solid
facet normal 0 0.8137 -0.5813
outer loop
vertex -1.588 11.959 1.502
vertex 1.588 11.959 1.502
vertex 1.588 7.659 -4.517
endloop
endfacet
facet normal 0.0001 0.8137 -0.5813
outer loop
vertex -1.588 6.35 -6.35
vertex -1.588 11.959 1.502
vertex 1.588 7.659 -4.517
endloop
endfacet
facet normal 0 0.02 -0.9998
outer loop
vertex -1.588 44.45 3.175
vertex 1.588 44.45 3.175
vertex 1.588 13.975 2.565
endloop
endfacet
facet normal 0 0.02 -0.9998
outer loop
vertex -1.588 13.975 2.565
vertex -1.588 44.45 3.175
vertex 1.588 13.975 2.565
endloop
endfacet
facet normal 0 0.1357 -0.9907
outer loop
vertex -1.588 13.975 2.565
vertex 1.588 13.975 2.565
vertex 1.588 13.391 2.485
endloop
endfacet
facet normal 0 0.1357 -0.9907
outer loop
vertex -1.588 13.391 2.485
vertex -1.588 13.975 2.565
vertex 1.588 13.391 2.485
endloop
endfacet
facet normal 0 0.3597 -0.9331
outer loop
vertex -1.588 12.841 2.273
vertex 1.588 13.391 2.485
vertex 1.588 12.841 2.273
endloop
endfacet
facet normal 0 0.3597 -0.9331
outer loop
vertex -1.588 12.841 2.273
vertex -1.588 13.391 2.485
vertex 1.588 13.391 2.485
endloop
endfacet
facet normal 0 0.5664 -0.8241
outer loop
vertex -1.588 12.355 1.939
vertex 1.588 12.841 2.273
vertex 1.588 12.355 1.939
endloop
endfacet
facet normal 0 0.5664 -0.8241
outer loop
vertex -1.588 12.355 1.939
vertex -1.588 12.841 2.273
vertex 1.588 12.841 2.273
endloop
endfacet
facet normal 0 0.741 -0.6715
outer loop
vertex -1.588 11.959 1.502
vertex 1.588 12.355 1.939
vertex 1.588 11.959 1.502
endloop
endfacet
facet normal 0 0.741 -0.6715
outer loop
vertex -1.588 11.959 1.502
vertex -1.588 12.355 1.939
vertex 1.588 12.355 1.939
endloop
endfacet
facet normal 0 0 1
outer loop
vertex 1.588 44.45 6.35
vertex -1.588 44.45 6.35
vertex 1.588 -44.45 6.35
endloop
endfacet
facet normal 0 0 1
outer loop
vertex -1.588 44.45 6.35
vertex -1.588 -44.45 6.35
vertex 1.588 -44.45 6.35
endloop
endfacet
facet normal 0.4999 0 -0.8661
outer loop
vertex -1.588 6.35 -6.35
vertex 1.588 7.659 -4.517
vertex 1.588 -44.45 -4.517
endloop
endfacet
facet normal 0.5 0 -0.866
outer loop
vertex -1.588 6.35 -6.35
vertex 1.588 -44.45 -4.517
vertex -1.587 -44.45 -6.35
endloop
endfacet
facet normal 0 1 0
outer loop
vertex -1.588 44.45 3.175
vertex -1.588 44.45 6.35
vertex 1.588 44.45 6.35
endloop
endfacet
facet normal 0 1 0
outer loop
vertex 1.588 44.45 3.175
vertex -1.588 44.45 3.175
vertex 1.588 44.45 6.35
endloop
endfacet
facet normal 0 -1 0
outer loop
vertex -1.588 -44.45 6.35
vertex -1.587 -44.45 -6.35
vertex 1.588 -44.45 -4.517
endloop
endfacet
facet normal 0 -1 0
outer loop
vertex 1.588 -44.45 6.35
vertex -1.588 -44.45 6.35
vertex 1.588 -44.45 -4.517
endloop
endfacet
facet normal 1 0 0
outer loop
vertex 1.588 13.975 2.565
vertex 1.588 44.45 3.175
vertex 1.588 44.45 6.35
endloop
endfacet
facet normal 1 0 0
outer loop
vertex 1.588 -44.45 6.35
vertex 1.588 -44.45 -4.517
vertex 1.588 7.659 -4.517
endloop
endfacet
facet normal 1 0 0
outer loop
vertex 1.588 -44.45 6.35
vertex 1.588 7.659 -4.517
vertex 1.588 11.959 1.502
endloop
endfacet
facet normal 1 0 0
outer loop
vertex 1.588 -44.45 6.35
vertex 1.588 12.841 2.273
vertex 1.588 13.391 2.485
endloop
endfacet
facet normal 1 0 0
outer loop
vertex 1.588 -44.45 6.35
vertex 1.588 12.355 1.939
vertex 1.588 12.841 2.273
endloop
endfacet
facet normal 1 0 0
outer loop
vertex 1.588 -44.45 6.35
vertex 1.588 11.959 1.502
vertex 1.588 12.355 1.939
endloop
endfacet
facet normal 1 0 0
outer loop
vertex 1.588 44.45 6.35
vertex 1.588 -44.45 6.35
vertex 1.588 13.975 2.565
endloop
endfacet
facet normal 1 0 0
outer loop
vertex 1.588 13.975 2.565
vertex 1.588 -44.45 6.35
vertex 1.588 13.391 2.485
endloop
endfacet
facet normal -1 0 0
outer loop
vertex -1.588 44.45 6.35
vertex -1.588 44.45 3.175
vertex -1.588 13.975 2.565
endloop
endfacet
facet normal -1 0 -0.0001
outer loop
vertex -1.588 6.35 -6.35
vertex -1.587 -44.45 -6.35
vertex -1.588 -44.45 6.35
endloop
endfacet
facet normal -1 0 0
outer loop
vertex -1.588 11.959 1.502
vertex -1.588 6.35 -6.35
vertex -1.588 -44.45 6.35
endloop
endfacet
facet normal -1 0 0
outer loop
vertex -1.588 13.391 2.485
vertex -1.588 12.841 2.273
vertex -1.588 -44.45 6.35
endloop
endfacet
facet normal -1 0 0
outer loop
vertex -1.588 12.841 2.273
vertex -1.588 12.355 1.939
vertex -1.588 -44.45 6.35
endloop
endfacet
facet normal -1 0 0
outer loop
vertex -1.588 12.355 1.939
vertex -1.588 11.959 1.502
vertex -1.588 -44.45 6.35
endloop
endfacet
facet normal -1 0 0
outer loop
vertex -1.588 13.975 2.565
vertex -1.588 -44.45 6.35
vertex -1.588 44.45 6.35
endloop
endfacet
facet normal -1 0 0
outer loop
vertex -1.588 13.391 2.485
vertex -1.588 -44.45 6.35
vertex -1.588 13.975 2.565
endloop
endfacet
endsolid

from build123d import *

# Parameters (mm, degrees)
F0_W     = 3.175
F0_H     = 12.7
F1_DEPTH = 44.45
F3_DEPTH = 3.176
F5_DEPTH = 82.55
F6_R     = 2.54


with BuildPart() as f1:
    # F0 (on Front) → F1 (new body, symmetric)
    with BuildSketch(Plane.XZ):
        Rectangle(F0_W, F0_H)
    extrude(amount=F1_DEPTH, both=True)

    # F2 (on face) → F3 (cut, through all)
    with BuildSketch(Plane.YZ.offset(1.5875)):
        Polygon((44.45, -6.35), (44.45, 3.175), (12.7, 2.54), (6.35, -6.35), align=None)
    extrude(amount=-F3_DEPTH, mode=Mode.SUBTRACT)

    # F4 (on face) → F5 (cut)
    with BuildSketch(Plane.XZ.offset(44.45)):
        Polygon((1.5875, -4.516913), (-1.5875, -6.35), (1.5875, -6.35), align=None)
    extrude(amount=-F5_DEPTH, mode=Mode.SUBTRACT)

    # F6
    f6_edges = [f1.edges().sort_by_distance(p)[0] for p in [
        (0, 12.7, 2.54),
    ]]
    fillet(f6_edges, radius=F6_R)


solid = f1.part
